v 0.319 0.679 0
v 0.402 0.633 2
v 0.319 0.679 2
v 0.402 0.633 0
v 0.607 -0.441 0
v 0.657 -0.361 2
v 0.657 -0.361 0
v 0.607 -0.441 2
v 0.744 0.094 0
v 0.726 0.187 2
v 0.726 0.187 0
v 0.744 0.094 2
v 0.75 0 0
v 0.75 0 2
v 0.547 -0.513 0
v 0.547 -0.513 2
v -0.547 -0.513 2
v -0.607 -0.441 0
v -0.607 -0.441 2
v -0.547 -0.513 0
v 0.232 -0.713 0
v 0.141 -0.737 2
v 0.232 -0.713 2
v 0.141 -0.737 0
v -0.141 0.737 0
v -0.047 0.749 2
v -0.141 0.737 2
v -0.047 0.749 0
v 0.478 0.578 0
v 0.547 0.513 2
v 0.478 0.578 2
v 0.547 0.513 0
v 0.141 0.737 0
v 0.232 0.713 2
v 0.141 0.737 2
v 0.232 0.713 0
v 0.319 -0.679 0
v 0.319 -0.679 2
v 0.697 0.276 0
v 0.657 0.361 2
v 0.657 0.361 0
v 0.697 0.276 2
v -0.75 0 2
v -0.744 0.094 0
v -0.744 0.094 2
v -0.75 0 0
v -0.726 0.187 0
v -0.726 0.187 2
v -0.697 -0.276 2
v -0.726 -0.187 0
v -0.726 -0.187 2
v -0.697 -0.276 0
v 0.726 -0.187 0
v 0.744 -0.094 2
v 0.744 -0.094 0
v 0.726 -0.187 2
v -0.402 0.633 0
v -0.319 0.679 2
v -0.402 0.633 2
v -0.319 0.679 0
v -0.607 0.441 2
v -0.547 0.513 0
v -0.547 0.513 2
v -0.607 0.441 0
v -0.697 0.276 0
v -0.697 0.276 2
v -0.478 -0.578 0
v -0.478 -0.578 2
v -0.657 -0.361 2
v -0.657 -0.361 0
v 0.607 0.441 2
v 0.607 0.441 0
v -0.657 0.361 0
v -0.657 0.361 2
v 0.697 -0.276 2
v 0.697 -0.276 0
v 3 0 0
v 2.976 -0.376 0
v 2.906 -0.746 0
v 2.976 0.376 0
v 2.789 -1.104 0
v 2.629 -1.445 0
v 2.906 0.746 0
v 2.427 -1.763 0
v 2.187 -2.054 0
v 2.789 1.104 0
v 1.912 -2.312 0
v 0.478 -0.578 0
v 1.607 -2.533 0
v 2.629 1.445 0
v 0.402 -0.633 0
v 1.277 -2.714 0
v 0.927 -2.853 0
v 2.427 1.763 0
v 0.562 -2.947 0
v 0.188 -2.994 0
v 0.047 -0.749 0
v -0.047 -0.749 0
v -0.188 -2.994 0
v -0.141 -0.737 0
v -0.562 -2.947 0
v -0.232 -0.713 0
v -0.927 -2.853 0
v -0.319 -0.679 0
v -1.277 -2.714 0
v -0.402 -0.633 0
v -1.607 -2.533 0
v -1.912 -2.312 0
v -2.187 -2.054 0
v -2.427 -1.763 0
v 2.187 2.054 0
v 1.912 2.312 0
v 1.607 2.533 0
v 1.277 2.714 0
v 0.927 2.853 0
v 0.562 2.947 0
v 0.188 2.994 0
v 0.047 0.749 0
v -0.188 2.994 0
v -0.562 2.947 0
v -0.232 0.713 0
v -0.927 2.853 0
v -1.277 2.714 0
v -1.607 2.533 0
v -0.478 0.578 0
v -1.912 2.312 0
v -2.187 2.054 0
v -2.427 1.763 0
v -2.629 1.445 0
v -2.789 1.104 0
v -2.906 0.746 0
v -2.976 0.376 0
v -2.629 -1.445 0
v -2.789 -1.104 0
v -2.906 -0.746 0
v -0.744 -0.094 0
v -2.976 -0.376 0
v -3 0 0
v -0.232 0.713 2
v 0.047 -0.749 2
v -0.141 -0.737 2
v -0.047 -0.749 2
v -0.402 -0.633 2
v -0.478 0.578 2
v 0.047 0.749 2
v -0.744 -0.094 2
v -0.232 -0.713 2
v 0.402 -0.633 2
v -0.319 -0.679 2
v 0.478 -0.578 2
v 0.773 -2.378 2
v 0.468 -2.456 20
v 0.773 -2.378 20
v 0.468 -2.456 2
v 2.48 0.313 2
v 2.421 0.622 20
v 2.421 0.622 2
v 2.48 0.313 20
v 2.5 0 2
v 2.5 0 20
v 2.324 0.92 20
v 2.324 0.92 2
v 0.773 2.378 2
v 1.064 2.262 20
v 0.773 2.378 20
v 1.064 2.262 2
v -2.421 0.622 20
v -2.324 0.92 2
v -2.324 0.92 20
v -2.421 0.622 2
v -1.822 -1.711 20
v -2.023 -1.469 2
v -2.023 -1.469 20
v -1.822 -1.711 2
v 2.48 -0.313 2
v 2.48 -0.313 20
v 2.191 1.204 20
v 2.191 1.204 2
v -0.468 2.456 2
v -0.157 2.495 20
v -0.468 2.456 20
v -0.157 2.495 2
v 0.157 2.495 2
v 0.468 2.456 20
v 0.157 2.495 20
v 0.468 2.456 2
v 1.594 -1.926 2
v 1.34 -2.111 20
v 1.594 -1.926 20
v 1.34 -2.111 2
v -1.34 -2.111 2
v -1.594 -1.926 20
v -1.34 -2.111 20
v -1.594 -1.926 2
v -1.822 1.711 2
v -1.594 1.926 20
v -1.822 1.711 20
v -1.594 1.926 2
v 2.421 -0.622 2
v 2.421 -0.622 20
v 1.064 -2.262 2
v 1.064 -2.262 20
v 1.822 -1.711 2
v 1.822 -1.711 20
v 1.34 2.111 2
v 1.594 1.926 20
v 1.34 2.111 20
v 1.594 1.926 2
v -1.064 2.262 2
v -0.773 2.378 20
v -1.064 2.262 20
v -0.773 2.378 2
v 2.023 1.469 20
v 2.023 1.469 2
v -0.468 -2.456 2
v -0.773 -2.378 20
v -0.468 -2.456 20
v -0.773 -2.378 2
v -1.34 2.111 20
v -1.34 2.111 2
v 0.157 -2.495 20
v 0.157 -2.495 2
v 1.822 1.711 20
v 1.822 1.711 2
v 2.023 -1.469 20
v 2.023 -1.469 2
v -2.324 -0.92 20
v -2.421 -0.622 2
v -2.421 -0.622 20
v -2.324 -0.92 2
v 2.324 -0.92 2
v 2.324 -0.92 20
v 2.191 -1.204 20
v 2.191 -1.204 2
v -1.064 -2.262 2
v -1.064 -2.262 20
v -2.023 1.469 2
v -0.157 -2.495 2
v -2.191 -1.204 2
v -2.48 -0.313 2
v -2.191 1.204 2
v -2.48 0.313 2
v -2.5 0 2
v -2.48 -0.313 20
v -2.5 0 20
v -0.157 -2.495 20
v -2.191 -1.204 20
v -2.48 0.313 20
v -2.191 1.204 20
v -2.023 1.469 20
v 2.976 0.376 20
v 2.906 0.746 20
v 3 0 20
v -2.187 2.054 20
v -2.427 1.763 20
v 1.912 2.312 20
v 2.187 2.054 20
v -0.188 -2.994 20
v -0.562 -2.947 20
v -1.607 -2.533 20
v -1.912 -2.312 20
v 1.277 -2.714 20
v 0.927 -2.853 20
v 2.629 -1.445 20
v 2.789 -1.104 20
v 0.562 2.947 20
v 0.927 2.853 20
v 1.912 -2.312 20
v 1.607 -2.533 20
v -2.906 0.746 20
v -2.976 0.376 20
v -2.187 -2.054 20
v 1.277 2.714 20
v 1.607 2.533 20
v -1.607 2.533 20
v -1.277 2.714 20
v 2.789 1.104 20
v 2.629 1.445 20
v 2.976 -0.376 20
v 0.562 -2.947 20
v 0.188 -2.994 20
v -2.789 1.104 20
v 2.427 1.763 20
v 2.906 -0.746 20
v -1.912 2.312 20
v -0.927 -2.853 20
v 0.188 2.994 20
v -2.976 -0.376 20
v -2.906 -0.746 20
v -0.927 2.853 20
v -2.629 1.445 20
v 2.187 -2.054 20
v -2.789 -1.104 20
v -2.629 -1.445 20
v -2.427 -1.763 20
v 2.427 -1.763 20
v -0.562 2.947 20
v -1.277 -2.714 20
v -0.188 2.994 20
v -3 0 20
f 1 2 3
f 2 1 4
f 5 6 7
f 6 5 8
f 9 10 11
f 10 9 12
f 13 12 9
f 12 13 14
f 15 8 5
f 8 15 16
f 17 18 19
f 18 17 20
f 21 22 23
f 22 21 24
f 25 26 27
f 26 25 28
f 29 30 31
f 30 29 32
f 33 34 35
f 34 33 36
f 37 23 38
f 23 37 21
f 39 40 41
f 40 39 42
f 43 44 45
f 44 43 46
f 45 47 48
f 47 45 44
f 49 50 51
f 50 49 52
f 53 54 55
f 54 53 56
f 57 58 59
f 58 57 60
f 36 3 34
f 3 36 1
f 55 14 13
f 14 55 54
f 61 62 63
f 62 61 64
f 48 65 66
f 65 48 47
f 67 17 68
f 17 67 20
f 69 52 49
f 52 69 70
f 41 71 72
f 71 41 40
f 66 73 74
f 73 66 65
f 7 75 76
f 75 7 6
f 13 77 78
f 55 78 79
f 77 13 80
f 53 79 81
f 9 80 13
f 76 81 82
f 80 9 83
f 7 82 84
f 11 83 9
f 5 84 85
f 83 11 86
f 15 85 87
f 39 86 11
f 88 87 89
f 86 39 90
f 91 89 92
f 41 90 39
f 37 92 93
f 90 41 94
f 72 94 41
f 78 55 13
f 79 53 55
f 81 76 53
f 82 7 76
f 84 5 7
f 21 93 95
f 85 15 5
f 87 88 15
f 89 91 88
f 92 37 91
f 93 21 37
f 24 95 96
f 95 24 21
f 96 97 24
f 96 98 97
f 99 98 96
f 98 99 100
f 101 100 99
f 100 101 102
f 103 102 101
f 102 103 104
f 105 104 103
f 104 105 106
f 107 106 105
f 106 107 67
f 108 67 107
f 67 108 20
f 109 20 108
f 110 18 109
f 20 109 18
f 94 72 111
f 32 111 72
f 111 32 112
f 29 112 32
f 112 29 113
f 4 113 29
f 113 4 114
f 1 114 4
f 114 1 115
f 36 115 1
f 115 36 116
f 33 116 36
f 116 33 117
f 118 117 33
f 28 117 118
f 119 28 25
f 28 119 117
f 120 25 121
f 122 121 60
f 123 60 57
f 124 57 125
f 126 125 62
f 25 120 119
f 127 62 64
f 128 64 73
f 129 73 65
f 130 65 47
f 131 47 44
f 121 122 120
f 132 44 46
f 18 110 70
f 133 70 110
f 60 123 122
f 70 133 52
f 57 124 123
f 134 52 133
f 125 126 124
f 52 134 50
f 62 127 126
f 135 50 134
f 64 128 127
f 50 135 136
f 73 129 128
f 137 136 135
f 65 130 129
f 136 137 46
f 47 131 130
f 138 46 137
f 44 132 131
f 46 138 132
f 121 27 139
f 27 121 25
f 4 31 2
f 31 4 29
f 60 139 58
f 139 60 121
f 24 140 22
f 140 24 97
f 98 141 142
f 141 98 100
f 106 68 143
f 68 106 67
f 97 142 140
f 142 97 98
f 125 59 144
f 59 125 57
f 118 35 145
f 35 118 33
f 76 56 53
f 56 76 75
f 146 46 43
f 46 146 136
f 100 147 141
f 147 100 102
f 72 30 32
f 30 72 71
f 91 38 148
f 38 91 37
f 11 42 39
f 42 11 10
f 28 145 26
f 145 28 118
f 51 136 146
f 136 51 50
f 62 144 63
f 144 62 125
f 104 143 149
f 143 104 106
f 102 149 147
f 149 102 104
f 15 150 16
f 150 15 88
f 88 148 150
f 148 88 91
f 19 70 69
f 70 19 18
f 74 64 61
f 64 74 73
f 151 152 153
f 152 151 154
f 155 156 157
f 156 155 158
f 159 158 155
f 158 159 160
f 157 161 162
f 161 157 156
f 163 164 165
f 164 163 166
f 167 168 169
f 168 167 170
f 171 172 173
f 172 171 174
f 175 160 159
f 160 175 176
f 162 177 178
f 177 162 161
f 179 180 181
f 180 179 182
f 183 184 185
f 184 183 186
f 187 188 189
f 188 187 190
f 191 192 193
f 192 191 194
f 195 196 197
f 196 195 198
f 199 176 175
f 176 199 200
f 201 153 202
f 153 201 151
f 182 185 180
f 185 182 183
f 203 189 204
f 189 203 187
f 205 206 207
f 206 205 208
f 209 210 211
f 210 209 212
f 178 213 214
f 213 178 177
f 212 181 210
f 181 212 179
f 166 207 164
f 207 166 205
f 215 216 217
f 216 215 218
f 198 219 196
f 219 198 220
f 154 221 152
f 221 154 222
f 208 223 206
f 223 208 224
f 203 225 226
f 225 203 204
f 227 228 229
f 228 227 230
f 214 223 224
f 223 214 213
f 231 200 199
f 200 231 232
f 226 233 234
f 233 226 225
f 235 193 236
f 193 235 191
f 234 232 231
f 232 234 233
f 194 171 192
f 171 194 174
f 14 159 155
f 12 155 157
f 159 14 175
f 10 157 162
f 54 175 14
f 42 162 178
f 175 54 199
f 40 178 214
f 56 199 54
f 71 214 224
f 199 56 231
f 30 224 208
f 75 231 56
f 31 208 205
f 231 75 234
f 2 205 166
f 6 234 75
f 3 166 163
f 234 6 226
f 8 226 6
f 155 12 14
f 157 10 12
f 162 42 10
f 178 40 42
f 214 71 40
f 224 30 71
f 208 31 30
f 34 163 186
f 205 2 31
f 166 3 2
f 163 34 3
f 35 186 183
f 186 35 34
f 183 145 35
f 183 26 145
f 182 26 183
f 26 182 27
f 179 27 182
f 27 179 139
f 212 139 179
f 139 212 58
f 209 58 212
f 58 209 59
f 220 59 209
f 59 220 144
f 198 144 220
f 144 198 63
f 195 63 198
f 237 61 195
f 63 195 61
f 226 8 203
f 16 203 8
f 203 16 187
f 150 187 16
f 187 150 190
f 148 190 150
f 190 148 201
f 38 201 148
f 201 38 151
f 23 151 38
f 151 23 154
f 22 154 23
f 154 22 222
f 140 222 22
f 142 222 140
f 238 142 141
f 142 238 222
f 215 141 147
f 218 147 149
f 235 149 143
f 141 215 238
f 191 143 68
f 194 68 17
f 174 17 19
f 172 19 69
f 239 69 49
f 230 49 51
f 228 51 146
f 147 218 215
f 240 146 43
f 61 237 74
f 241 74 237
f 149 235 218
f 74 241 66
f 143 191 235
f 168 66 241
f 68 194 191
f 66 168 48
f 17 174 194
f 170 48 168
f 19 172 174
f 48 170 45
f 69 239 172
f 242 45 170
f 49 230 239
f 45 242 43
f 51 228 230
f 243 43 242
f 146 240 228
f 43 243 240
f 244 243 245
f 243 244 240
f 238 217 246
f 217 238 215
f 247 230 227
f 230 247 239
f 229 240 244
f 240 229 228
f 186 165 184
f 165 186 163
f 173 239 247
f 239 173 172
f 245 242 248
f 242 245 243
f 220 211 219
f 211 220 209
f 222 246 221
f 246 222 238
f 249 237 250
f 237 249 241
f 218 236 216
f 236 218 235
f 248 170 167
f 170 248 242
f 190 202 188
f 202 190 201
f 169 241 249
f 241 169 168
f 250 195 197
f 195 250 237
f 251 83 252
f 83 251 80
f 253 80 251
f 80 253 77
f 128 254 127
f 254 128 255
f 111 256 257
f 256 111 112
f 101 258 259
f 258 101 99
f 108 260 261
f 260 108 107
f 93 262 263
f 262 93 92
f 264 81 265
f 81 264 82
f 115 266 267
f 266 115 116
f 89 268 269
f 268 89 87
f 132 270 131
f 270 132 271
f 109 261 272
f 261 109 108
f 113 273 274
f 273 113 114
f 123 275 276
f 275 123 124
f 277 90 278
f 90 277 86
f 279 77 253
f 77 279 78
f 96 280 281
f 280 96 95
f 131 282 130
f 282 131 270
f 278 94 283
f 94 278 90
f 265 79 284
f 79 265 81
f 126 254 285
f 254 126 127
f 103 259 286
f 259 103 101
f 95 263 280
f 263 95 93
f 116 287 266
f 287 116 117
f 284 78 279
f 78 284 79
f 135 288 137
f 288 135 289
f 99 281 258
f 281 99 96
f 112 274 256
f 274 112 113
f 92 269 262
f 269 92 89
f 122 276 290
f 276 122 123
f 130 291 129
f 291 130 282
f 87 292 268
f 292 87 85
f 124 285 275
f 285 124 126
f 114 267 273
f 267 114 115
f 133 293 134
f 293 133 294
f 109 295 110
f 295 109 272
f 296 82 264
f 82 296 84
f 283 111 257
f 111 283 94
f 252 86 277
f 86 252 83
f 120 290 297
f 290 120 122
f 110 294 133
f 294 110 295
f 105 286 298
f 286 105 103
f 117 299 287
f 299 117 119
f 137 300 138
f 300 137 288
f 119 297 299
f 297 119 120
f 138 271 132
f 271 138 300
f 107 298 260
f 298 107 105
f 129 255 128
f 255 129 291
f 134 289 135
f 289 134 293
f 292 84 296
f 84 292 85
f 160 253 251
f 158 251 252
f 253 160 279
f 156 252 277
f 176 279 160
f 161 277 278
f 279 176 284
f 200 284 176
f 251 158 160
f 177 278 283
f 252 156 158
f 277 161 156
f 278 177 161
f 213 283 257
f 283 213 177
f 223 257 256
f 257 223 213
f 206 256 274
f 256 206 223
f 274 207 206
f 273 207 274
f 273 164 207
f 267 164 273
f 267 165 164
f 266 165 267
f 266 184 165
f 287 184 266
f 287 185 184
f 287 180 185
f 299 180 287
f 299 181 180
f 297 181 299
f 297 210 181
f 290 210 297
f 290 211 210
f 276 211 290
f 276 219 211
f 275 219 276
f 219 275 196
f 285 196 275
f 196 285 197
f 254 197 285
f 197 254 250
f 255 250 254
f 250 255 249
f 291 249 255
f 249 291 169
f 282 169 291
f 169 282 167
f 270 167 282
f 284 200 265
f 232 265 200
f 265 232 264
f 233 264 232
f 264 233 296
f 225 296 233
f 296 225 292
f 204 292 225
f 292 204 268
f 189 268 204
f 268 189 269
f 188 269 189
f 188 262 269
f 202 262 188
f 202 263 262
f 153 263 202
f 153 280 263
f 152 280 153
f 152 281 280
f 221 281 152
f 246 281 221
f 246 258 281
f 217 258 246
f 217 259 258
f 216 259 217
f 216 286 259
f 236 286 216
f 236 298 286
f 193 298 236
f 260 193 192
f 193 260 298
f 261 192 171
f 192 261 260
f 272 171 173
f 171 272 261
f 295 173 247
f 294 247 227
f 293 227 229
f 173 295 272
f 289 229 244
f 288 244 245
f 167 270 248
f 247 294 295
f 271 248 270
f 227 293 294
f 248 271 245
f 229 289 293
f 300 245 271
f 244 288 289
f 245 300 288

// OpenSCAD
$fn=50;

difference(){
    cylinder(d=6, h=20);
    union(){
    cylinder(d=1.5, h=20);
    translate([0,0,2])
        cylinder(d=5, h=20);
    }
}
